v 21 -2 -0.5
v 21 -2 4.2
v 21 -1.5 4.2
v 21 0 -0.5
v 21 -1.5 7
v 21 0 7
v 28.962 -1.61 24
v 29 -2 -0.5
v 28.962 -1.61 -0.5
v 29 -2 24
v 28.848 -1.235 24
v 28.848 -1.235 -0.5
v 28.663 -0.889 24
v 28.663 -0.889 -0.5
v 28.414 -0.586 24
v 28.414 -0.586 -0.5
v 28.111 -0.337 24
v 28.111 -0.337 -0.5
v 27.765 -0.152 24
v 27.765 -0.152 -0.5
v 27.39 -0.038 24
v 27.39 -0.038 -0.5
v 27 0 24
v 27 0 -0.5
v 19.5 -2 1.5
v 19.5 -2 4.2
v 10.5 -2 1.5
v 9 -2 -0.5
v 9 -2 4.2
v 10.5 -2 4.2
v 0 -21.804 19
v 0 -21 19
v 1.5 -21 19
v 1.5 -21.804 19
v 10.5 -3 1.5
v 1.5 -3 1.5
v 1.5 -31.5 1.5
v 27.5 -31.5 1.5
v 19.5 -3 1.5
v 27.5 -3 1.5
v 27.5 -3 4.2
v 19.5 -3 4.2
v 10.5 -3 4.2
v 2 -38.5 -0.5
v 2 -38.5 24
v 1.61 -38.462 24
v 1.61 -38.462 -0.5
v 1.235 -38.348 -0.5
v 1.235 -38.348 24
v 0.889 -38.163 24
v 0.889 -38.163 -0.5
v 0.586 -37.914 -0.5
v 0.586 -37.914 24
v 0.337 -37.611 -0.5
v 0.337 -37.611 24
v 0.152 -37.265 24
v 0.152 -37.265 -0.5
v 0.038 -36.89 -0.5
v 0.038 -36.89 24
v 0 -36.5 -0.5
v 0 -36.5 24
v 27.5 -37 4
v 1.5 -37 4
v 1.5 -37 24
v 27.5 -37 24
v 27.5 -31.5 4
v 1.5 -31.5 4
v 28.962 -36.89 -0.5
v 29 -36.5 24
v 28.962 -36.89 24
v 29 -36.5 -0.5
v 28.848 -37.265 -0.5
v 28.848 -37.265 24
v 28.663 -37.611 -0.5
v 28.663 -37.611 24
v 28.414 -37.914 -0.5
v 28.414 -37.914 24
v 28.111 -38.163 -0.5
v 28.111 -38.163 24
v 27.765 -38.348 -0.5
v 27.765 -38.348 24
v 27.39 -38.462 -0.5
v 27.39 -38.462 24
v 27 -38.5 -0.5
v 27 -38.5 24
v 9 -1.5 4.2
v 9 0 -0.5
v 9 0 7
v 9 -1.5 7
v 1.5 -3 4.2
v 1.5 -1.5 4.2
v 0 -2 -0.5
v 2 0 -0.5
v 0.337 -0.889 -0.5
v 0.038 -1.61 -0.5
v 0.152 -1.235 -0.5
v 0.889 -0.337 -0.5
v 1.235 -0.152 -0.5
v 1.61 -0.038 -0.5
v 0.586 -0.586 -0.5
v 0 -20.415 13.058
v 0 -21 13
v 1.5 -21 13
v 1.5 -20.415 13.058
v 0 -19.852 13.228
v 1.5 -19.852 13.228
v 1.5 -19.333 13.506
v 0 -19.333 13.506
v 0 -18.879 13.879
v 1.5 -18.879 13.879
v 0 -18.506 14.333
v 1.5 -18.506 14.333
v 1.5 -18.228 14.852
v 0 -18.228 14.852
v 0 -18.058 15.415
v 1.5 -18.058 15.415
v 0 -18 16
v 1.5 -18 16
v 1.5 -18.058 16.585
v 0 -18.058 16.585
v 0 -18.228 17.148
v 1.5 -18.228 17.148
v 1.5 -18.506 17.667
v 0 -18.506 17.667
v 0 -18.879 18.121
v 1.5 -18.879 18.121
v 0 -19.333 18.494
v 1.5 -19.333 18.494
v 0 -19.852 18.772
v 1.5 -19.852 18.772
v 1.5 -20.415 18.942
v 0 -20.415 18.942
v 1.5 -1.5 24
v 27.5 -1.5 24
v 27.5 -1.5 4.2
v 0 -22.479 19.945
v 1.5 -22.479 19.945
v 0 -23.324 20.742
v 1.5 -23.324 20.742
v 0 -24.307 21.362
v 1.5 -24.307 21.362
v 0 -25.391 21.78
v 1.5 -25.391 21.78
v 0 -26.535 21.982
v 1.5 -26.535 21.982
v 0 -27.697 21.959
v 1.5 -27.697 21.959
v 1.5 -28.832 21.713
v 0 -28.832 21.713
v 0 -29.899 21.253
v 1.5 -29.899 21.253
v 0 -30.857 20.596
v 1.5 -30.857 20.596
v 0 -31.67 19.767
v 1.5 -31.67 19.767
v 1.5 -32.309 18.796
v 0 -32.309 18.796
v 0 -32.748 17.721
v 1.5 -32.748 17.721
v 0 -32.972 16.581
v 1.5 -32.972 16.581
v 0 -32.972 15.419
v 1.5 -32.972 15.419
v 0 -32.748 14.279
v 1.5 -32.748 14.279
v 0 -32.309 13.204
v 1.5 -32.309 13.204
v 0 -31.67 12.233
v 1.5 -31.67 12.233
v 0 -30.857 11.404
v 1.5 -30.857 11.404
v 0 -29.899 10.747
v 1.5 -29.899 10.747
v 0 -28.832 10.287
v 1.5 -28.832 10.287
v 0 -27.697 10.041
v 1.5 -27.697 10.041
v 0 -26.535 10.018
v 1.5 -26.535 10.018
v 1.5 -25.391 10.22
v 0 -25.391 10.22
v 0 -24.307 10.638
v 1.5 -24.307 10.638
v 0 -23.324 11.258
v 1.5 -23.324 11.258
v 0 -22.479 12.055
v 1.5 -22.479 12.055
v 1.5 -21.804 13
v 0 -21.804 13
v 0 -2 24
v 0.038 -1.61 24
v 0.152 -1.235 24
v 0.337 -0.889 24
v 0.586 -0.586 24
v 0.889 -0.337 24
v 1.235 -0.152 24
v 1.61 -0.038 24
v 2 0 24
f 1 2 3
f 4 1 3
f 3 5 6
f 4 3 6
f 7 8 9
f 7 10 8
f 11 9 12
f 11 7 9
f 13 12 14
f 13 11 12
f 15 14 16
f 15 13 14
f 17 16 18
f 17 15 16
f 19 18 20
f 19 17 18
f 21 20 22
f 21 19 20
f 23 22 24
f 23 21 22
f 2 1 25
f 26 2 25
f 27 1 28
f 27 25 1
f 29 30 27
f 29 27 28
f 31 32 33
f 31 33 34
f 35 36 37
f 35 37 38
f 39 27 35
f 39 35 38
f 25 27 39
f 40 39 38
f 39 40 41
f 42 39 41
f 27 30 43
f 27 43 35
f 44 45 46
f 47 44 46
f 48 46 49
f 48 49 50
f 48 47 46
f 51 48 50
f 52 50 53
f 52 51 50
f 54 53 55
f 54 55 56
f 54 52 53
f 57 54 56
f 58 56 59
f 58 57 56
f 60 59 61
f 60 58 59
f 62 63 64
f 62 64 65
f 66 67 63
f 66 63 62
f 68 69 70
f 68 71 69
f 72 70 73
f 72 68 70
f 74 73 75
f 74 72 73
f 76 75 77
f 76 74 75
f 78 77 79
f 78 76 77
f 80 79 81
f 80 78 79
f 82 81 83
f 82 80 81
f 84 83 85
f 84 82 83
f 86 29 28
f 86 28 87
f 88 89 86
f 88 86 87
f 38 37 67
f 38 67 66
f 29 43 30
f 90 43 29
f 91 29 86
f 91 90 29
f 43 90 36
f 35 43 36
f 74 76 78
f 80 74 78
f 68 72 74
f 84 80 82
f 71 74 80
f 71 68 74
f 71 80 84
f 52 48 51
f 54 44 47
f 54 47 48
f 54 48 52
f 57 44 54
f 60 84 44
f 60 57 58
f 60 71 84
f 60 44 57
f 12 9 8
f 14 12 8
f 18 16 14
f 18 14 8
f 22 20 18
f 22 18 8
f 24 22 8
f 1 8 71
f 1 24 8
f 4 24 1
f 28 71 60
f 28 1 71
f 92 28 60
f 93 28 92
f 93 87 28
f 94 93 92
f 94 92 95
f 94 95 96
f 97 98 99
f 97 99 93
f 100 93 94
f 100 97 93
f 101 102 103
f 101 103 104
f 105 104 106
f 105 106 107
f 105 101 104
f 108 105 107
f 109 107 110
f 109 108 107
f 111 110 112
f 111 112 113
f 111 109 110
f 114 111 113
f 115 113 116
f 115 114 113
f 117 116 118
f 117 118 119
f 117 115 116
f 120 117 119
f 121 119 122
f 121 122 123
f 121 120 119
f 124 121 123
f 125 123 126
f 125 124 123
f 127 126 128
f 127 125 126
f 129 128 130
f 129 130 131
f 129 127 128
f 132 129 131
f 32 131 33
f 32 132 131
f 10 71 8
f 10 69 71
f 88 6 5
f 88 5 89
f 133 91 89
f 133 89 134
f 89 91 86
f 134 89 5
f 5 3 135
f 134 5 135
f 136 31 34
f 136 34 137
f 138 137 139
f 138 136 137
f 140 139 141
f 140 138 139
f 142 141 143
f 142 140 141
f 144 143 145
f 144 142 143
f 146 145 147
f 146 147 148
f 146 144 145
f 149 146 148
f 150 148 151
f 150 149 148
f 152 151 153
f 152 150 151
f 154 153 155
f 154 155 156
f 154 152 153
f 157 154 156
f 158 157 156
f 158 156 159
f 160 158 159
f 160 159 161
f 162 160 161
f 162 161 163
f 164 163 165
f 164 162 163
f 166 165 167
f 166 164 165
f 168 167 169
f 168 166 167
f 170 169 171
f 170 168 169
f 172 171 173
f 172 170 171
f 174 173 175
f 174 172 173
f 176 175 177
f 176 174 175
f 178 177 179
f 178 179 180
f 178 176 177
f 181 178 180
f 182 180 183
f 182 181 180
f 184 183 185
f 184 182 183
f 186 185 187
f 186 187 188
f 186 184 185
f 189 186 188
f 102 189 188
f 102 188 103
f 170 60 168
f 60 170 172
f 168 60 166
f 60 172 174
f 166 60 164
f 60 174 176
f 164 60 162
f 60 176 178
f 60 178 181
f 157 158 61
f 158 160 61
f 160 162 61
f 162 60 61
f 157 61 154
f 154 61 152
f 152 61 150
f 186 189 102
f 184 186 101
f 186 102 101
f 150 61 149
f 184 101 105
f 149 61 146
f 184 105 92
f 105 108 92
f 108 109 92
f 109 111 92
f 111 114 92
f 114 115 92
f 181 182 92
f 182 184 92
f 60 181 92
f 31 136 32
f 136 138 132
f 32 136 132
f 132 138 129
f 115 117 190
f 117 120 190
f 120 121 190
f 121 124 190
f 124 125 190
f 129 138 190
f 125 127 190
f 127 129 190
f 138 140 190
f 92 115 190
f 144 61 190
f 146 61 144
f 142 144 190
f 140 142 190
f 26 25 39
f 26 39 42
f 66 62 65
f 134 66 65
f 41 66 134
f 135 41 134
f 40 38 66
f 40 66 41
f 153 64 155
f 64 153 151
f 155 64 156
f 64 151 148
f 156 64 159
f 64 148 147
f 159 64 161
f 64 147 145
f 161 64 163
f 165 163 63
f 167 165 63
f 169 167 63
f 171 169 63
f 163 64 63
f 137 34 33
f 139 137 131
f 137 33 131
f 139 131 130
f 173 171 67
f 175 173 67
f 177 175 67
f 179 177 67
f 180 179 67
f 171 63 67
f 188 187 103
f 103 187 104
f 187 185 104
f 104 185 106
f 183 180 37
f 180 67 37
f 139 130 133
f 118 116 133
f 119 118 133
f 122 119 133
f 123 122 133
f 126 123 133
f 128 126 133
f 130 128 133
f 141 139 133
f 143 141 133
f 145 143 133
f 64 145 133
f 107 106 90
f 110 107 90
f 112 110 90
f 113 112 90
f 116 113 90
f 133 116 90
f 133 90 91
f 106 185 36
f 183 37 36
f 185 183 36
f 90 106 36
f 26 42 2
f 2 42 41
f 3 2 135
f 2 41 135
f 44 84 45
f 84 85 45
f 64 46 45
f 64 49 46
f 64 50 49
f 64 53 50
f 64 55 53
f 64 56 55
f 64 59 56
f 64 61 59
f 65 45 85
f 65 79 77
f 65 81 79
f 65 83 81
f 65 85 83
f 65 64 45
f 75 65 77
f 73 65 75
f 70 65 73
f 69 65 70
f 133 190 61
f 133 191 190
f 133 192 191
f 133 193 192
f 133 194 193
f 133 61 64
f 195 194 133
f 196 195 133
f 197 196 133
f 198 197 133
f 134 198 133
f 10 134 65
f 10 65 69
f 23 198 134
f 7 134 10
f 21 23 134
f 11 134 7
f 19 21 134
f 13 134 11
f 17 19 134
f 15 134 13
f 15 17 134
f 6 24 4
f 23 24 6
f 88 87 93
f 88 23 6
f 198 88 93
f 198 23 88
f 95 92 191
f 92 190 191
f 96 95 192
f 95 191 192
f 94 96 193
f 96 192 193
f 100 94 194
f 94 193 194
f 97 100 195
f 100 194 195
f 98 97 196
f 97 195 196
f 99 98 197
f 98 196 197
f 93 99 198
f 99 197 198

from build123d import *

# Parameters (mm, degrees)
SKETCH_1_W               = 29
SKETCH_1_H               = 38.5
EXTRUDE_1_DEPTH          = 24
SHELL_1_T                = -1.5
SKETCH_7_W               = 26
SKETCH_7_H               = 5.5
EXTRUDE_7_DEPTH          = 2.5
SKETCH_5_W               = 2.7
SKETCH_5_H               = 1.5
EXTRUDE_8_DEPTH          = 8
SKETCH_6_W               = 2.7
SKETCH_6_H               = 1.5
EXTRUDE_9_DEPTH          = 9
CUT_EXTRUDE_7_DEPTH      = 1.5
SKETCH_9_W               = 29
SKETCH_9_H               = 38.5
EXTRUDE_10_DEPTH         = 0.5
FILLET_3_R               = 2
CUT_EXTRUDE_8_DEPTH      = 1.5
CUT_EXTRUDE_8_DEPTH_BACK = 7
SKETCH_2_W               = 12
SKETCH_2_H               = 2


with BuildPart() as part:
    # 草图1 → 凸台-拉伸1 (new body)
    with BuildSketch(Plane.XY):
        with Locations((14.5, -19.25)):
            Rectangle(SKETCH_1_W, SKETCH_1_H)
    extrude(amount=EXTRUDE_1_DEPTH)

    # 抽壳1
    shell_1_openings = [part.faces().sort_by_distance(p)[0] for p in [
        (14.5, -19.25, 24),
    ]]
    offset(amount=SHELL_1_T, openings=shell_1_openings, kind=Kind.INTERSECTION)

    # 草图7 → 凸台-拉伸7 (add)
    with BuildSketch(Plane.XY.offset(1.5)):
        with Locations((14.5, -34.25)):
            Rectangle(SKETCH_7_W, SKETCH_7_H)
    extrude(amount=EXTRUDE_7_DEPTH)

    # 草图5 → 凸台-拉伸8 (add)
    with BuildSketch(Plane.ZY.offset(-27.5)):
        with Locations((2.85, -2.25)):
            Rectangle(SKETCH_5_W, SKETCH_5_H)
    extrude(amount=EXTRUDE_8_DEPTH)

    # 草图6 → 凸台-拉伸9 (add)
    with BuildSketch(Plane(origin=(1.5, 0, 0), x_dir=(0, 0, -1), z_dir=(1, 0, 0))):
        with Locations((-2.85, -2.25)):
            Rectangle(SKETCH_6_W, SKETCH_6_H)
    extrude(amount=EXTRUDE_9_DEPTH)

    # 草图8 → 切除-拉伸7 (cut)
    with BuildSketch(Plane.ZY):
        with BuildLine():
            Line((19, -21), (19, -21.803847577))
            ThreePointArc((19, -21.803847577), (16, -33), (13, -21.803847577))
            Line((13, -21.803847577), (13, -21))
            ThreePointArc((13, -21), (16, -18), (19, -21))
        make_face()
    extrude(amount=-CUT_EXTRUDE_7_DEPTH, mode=Mode.SUBTRACT)

    # 草图9 → 凸台-拉伸10 (add)
    with BuildSketch(Plane(origin=(0, 0, 0), x_dir=(-1, 0, 0), z_dir=(0, 0, -1))):
        with Locations((-14.5, -19.25)):
            Rectangle(SKETCH_9_W, SKETCH_9_H)
    extrude(amount=EXTRUDE_10_DEPTH)

    # 圆角3
    fillet_3_edges = [part.edges().sort_by_distance(p)[0] for p in [
        (0, 0, 11.75),
        (29, 0, 11.75),
        (29, -38.5, 11.75),
        (0, -38.5, 11.75),
    ]]
    fillet(fillet_3_edges, radius=FILLET_3_R)

    # 草图2 → 切除-拉伸8 (cut, two sides: drawn at the far end of the back side and taken through both)
    with BuildSketch(Plane(origin=(0, 0, 0), x_dir=(-1, 0, 0), z_dir=(0, 0, -1)).offset(-CUT_EXTRUDE_8_DEPTH_BACK)):
        with Locations((-15, -1)):
            Rectangle(SKETCH_2_W, SKETCH_2_H)
    extrude(amount=CUT_EXTRUDE_8_DEPTH + CUT_EXTRUDE_8_DEPTH_BACK, mode=Mode.SUBTRACT)


solid = part.part
